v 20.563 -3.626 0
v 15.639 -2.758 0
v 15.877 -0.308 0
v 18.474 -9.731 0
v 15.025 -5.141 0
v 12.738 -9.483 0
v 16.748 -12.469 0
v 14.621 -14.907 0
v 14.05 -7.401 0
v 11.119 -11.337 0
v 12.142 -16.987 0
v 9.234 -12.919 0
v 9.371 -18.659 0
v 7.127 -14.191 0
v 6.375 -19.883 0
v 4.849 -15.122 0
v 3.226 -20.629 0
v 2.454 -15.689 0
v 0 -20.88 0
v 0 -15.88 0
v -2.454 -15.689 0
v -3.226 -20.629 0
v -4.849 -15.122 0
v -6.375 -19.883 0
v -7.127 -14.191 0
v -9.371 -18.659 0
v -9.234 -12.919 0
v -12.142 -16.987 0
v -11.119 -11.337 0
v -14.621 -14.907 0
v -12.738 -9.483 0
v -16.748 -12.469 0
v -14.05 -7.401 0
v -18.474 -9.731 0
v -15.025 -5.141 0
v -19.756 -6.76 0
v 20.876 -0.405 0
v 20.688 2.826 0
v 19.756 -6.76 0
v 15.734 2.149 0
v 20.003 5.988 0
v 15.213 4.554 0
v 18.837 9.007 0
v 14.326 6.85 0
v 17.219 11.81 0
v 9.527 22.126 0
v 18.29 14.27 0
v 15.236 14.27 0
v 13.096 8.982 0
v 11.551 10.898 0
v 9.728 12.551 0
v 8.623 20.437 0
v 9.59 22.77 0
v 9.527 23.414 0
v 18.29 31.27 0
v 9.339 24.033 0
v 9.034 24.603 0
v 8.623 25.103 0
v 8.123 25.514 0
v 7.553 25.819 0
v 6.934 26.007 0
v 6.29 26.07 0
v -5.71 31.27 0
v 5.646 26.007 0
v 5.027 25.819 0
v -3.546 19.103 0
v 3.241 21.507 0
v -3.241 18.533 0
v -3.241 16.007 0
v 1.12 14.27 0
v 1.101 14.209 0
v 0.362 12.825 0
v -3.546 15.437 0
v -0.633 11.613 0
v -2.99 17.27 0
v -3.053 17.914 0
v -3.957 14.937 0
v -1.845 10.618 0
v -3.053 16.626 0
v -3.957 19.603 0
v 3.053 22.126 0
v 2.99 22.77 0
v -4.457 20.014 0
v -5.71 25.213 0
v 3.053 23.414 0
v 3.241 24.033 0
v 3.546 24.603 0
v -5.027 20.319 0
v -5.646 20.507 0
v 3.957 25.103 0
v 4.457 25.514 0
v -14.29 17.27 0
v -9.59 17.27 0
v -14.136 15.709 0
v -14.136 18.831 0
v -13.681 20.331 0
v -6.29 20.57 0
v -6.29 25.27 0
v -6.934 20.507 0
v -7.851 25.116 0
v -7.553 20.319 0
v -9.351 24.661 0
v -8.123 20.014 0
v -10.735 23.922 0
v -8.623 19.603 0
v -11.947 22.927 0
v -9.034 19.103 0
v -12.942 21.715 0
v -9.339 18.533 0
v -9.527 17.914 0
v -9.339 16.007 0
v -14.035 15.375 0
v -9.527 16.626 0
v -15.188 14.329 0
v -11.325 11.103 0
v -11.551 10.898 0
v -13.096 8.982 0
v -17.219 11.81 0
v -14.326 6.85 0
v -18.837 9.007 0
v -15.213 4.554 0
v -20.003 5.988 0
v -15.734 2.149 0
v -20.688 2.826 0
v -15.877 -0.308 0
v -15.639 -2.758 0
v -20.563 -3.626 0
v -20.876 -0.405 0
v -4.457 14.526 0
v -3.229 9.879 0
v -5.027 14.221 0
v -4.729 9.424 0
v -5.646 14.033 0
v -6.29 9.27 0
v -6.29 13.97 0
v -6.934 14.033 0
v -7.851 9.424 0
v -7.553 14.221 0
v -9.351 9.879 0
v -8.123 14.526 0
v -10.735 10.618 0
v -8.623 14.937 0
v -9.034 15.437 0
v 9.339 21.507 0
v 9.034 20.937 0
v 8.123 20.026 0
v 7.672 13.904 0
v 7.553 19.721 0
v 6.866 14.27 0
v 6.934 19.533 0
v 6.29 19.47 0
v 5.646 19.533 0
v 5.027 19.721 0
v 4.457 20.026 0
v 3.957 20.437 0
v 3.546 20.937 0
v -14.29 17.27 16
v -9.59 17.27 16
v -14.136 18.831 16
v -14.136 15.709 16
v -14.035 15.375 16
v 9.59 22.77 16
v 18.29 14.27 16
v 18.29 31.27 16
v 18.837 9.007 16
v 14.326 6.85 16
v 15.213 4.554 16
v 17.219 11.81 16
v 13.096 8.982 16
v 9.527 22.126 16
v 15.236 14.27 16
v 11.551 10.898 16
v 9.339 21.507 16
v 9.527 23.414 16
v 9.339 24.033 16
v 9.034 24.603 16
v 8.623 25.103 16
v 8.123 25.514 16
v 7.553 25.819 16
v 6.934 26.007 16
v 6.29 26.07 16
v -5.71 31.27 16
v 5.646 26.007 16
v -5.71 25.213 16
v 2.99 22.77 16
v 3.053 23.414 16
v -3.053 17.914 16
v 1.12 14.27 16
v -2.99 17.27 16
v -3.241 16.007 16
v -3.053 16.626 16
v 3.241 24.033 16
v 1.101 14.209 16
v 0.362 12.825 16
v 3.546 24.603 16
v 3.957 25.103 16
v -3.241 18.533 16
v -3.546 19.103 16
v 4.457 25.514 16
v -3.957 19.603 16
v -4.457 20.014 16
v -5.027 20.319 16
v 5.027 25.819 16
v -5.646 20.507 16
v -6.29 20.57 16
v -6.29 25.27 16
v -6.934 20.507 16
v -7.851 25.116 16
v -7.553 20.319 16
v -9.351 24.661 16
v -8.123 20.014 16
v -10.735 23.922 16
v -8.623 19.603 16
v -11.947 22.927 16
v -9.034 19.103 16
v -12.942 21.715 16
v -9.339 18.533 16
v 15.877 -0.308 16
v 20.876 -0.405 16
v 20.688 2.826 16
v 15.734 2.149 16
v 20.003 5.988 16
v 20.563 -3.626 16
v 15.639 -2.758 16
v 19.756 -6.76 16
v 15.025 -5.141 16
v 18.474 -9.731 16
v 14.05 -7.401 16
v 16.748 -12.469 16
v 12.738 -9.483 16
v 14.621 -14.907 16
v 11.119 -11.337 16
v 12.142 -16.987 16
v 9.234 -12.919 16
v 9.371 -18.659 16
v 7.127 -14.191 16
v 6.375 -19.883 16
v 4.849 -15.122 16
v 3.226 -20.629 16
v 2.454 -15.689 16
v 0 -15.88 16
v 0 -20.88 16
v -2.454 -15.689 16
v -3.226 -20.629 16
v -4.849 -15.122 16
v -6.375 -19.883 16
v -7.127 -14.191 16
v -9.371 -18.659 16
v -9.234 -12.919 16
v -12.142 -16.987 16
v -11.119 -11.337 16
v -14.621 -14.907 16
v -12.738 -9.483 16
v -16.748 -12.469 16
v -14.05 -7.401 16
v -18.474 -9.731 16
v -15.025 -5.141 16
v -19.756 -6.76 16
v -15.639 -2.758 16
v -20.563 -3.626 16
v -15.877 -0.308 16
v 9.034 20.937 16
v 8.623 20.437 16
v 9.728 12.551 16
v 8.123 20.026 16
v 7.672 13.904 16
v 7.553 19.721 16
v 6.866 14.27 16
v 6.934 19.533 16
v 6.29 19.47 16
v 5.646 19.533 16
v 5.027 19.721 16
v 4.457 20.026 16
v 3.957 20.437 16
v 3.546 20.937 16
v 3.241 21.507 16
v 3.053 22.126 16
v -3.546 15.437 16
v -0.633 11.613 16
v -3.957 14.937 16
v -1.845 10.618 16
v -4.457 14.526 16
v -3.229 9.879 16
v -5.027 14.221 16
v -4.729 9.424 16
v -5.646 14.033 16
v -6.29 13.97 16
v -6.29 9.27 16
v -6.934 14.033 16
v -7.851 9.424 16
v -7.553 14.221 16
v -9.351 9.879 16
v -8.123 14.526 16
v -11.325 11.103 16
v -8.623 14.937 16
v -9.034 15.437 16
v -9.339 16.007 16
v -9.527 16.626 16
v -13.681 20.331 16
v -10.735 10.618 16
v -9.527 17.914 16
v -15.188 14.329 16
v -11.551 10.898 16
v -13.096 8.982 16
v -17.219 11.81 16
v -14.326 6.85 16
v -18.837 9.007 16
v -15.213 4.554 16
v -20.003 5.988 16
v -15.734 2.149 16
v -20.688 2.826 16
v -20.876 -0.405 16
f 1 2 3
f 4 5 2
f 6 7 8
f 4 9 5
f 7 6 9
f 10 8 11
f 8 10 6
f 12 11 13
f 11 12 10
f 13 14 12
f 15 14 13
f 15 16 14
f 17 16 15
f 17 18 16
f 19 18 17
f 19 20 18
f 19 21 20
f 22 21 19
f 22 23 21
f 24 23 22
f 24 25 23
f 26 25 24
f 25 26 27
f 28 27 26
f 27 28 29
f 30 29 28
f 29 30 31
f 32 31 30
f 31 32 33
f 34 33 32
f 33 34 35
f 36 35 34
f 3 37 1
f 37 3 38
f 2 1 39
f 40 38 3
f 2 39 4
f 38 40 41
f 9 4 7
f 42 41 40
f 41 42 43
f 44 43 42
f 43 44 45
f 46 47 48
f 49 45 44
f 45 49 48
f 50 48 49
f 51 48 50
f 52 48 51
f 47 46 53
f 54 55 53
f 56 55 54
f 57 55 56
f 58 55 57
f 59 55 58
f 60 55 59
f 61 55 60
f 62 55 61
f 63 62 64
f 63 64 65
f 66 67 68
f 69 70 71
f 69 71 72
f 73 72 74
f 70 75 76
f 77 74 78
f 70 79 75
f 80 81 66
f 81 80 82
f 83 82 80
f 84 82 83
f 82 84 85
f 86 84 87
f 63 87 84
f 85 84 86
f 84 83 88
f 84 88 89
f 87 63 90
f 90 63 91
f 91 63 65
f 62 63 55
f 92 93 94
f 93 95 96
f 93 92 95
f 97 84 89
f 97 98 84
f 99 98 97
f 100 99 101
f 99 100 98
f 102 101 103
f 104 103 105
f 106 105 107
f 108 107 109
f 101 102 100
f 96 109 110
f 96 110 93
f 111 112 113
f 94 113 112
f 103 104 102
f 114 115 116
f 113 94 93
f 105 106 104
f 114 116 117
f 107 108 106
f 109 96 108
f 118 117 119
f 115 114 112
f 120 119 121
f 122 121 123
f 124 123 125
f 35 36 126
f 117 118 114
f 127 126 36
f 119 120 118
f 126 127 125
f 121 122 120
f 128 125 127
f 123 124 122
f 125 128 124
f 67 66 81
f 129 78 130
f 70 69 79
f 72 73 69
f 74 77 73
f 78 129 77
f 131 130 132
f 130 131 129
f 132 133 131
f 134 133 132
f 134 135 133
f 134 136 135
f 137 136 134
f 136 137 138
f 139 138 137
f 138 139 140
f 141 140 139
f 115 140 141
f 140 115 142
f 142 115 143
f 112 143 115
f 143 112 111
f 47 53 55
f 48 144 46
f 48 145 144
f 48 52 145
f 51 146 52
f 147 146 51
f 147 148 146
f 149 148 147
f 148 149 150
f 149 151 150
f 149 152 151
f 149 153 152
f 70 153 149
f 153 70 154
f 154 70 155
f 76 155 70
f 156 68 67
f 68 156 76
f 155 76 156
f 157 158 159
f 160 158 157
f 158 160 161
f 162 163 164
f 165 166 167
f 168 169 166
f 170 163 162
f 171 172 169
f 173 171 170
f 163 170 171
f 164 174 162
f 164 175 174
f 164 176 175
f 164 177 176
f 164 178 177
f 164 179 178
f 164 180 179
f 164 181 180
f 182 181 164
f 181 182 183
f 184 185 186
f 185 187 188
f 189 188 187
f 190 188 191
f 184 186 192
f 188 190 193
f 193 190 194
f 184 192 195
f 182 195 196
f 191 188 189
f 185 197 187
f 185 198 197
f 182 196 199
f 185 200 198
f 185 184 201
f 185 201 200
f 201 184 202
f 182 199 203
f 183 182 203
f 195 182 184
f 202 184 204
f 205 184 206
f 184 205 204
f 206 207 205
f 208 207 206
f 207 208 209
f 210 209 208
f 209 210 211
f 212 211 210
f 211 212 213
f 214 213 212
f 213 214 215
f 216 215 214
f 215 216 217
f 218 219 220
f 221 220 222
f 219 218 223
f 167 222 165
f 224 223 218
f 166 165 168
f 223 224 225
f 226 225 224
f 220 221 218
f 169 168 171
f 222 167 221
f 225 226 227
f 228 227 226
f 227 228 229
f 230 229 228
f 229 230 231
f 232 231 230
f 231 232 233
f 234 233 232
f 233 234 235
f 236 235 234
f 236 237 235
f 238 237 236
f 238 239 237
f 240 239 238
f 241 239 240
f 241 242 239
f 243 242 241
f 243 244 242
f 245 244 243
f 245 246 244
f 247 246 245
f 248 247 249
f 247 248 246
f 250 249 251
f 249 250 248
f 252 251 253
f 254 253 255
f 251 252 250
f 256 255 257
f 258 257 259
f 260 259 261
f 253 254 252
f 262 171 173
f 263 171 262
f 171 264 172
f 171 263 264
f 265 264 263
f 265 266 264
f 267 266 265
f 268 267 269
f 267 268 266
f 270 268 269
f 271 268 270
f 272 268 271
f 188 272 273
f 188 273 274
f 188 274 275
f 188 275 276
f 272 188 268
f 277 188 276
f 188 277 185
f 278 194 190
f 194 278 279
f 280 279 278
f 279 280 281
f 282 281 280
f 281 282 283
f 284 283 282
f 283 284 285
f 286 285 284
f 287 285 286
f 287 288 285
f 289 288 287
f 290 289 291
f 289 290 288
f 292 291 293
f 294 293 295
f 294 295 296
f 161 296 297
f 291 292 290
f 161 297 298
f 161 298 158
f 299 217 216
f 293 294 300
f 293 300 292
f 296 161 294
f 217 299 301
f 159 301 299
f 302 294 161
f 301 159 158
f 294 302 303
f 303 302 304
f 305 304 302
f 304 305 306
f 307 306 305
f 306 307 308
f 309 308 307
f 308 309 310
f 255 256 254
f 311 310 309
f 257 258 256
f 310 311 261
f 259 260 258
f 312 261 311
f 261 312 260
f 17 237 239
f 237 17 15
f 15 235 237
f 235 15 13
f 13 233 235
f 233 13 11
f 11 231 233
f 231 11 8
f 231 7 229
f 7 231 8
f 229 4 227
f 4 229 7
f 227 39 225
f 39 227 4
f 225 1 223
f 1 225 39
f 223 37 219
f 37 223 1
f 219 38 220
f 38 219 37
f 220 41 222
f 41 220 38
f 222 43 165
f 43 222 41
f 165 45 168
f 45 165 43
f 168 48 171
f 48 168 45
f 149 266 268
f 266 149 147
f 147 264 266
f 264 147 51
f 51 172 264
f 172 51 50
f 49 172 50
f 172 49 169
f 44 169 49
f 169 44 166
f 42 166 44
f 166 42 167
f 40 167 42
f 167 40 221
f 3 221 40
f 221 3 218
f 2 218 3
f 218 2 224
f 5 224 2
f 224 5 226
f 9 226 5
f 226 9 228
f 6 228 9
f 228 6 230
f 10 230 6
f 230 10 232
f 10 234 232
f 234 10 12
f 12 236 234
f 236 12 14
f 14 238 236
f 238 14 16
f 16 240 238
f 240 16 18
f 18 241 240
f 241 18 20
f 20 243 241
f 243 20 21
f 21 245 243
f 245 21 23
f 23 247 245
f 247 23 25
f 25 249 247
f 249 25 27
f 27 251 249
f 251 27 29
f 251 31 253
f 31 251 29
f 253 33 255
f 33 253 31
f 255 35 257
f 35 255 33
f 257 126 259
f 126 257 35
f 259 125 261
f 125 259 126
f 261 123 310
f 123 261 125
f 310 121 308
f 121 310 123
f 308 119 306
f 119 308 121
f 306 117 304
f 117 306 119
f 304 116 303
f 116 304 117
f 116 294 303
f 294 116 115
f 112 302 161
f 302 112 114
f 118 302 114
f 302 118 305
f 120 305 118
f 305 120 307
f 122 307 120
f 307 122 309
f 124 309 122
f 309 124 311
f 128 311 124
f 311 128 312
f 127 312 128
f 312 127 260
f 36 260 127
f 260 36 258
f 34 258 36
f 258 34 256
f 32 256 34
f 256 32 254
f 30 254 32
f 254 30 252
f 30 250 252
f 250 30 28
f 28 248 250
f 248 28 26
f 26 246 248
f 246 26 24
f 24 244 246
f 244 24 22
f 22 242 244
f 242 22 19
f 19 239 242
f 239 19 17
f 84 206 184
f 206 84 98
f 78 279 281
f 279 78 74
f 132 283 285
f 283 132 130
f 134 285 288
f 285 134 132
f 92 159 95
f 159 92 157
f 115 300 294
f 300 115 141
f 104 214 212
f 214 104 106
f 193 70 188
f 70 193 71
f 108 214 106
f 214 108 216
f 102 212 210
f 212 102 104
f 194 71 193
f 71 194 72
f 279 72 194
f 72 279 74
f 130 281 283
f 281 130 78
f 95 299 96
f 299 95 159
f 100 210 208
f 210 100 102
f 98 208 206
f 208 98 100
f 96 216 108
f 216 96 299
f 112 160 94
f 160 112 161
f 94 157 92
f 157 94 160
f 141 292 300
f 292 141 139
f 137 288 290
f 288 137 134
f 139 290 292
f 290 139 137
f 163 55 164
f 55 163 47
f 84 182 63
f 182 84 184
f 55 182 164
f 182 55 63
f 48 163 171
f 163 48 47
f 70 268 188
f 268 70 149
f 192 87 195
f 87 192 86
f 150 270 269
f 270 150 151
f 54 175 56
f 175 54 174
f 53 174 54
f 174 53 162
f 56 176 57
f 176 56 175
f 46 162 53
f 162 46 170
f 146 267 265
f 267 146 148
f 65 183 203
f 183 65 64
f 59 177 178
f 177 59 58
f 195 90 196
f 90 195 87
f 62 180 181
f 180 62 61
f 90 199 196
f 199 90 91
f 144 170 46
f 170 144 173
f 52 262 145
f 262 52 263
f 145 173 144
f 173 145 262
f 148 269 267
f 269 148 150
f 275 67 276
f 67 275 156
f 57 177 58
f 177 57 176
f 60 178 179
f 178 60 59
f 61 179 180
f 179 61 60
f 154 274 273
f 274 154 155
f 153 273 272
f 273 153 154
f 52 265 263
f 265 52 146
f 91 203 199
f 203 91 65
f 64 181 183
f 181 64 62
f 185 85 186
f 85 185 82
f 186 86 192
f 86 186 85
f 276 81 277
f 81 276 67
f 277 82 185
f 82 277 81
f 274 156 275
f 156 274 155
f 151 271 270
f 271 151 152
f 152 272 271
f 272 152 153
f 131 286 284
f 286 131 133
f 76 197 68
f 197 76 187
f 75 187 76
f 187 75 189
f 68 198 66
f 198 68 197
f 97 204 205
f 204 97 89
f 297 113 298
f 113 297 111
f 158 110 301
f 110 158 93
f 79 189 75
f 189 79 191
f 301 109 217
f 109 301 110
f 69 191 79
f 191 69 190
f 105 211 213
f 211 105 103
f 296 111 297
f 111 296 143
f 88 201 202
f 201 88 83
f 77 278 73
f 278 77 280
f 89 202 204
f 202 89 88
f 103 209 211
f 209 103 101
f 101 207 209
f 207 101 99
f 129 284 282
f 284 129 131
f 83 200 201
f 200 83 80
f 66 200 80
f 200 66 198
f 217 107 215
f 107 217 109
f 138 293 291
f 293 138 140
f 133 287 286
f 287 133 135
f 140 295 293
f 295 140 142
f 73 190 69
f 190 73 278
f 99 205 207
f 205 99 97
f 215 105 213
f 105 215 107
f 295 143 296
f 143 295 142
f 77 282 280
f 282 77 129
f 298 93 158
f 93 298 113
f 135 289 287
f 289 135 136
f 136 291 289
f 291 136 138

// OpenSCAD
$fn = 32;

// ----------------------------------------------------------------------
// Pipe clamp: 41.76 mm ring, 5 mm wall, 16 mm wide
// ----------------------------------------------------------------------

// --- parameters (mm) ---
outer_r = 20.88;          // clamp outside radius
inner_r = 15.88;          // pipe bore radius
band = 5;                 // band thickness
clamp_w = 16;             // clamp width
opening = 40;             // opening angle between the ends
lug_w = 24;               // lug width
lug_len = 17;             // lug length
bolt_d = 6.6;             // bolt hole
knuckle_d = 16;           // hinge knuckle diameter
pin_d = 6.6;              // hinge pin hole

clamp_profile = [[-7.141, 19.621], [-10.087, 18.282], [-12.791, 16.503], [-15.188, 14.329], [-17.219, 11.81], [-18.837, 9.007], [-20.003, 5.988], [-20.688, 2.826], [-20.876, -0.405], [-20.563, -3.626], [-19.756, -6.76], [-18.474, -9.731], [-16.748, -12.469], [-14.621, -14.907], [-12.142, -16.987], [-9.371, -18.659], [-6.375, -19.883], [-3.226, -20.629], [0, -20.88], [3.226, -20.629], [6.375, -19.883], [9.371, -18.659], [12.142, -16.987], [14.621, -14.907], [16.748, -12.469], [18.474, -9.731], [19.756, -6.76], [20.563, -3.626], [20.876, -0.405], [20.688, 2.826], [20.003, 5.988], [18.837, 9.007], [17.219, 11.81], [15.188, 14.329], [12.791, 16.503], [10.087, 18.282], [7.141, 19.621], [5.431, 14.922], [7.672, 13.904], [9.728, 12.551], [11.551, 10.898], [13.096, 8.982], [14.326, 6.85], [15.213, 4.554], [15.734, 2.149], [15.877, -0.308], [15.639, -2.758], [15.025, -5.141], [14.05, -7.401], [12.738, -9.483], [11.119, -11.337], [9.234, -12.919], [7.127, -14.191], [4.849, -15.122], [2.454, -15.689], [0, -15.88], [-2.454, -15.689], [-4.849, -15.122], [-7.127, -14.191], [-9.234, -12.919], [-11.119, -11.337], [-12.738, -9.483], [-14.05, -7.401], [-15.025, -5.141], [-15.639, -2.758], [-15.877, -0.308], [-15.734, 2.149], [-15.213, 4.554], [-14.326, 6.85], [-13.096, 8.982], [-11.551, 10.898], [-9.728, 12.551], [-7.672, 13.904], [-5.431, 14.922]];

difference() {
  union() {
    linear_extrude(height = clamp_w) polygon(clamp_profile);
    /* hinge knuckle, sunk 2 mm into the band end */
    translate([-6.29, 17.27, 0]) cylinder(h = clamp_w, d = knuckle_d);
    /* bolt lug on the other end */
    translate([-5.71, 14.27, 0]) cube([lug_w, 17, clamp_w]);
  }
  translate([6.29, 22.77, -2.5]) cylinder(h = clamp_w + 5, d = bolt_d);
  translate([-6.29, 17.27, -2.5]) cylinder(h = clamp_w + 5, d = pin_d);
}
